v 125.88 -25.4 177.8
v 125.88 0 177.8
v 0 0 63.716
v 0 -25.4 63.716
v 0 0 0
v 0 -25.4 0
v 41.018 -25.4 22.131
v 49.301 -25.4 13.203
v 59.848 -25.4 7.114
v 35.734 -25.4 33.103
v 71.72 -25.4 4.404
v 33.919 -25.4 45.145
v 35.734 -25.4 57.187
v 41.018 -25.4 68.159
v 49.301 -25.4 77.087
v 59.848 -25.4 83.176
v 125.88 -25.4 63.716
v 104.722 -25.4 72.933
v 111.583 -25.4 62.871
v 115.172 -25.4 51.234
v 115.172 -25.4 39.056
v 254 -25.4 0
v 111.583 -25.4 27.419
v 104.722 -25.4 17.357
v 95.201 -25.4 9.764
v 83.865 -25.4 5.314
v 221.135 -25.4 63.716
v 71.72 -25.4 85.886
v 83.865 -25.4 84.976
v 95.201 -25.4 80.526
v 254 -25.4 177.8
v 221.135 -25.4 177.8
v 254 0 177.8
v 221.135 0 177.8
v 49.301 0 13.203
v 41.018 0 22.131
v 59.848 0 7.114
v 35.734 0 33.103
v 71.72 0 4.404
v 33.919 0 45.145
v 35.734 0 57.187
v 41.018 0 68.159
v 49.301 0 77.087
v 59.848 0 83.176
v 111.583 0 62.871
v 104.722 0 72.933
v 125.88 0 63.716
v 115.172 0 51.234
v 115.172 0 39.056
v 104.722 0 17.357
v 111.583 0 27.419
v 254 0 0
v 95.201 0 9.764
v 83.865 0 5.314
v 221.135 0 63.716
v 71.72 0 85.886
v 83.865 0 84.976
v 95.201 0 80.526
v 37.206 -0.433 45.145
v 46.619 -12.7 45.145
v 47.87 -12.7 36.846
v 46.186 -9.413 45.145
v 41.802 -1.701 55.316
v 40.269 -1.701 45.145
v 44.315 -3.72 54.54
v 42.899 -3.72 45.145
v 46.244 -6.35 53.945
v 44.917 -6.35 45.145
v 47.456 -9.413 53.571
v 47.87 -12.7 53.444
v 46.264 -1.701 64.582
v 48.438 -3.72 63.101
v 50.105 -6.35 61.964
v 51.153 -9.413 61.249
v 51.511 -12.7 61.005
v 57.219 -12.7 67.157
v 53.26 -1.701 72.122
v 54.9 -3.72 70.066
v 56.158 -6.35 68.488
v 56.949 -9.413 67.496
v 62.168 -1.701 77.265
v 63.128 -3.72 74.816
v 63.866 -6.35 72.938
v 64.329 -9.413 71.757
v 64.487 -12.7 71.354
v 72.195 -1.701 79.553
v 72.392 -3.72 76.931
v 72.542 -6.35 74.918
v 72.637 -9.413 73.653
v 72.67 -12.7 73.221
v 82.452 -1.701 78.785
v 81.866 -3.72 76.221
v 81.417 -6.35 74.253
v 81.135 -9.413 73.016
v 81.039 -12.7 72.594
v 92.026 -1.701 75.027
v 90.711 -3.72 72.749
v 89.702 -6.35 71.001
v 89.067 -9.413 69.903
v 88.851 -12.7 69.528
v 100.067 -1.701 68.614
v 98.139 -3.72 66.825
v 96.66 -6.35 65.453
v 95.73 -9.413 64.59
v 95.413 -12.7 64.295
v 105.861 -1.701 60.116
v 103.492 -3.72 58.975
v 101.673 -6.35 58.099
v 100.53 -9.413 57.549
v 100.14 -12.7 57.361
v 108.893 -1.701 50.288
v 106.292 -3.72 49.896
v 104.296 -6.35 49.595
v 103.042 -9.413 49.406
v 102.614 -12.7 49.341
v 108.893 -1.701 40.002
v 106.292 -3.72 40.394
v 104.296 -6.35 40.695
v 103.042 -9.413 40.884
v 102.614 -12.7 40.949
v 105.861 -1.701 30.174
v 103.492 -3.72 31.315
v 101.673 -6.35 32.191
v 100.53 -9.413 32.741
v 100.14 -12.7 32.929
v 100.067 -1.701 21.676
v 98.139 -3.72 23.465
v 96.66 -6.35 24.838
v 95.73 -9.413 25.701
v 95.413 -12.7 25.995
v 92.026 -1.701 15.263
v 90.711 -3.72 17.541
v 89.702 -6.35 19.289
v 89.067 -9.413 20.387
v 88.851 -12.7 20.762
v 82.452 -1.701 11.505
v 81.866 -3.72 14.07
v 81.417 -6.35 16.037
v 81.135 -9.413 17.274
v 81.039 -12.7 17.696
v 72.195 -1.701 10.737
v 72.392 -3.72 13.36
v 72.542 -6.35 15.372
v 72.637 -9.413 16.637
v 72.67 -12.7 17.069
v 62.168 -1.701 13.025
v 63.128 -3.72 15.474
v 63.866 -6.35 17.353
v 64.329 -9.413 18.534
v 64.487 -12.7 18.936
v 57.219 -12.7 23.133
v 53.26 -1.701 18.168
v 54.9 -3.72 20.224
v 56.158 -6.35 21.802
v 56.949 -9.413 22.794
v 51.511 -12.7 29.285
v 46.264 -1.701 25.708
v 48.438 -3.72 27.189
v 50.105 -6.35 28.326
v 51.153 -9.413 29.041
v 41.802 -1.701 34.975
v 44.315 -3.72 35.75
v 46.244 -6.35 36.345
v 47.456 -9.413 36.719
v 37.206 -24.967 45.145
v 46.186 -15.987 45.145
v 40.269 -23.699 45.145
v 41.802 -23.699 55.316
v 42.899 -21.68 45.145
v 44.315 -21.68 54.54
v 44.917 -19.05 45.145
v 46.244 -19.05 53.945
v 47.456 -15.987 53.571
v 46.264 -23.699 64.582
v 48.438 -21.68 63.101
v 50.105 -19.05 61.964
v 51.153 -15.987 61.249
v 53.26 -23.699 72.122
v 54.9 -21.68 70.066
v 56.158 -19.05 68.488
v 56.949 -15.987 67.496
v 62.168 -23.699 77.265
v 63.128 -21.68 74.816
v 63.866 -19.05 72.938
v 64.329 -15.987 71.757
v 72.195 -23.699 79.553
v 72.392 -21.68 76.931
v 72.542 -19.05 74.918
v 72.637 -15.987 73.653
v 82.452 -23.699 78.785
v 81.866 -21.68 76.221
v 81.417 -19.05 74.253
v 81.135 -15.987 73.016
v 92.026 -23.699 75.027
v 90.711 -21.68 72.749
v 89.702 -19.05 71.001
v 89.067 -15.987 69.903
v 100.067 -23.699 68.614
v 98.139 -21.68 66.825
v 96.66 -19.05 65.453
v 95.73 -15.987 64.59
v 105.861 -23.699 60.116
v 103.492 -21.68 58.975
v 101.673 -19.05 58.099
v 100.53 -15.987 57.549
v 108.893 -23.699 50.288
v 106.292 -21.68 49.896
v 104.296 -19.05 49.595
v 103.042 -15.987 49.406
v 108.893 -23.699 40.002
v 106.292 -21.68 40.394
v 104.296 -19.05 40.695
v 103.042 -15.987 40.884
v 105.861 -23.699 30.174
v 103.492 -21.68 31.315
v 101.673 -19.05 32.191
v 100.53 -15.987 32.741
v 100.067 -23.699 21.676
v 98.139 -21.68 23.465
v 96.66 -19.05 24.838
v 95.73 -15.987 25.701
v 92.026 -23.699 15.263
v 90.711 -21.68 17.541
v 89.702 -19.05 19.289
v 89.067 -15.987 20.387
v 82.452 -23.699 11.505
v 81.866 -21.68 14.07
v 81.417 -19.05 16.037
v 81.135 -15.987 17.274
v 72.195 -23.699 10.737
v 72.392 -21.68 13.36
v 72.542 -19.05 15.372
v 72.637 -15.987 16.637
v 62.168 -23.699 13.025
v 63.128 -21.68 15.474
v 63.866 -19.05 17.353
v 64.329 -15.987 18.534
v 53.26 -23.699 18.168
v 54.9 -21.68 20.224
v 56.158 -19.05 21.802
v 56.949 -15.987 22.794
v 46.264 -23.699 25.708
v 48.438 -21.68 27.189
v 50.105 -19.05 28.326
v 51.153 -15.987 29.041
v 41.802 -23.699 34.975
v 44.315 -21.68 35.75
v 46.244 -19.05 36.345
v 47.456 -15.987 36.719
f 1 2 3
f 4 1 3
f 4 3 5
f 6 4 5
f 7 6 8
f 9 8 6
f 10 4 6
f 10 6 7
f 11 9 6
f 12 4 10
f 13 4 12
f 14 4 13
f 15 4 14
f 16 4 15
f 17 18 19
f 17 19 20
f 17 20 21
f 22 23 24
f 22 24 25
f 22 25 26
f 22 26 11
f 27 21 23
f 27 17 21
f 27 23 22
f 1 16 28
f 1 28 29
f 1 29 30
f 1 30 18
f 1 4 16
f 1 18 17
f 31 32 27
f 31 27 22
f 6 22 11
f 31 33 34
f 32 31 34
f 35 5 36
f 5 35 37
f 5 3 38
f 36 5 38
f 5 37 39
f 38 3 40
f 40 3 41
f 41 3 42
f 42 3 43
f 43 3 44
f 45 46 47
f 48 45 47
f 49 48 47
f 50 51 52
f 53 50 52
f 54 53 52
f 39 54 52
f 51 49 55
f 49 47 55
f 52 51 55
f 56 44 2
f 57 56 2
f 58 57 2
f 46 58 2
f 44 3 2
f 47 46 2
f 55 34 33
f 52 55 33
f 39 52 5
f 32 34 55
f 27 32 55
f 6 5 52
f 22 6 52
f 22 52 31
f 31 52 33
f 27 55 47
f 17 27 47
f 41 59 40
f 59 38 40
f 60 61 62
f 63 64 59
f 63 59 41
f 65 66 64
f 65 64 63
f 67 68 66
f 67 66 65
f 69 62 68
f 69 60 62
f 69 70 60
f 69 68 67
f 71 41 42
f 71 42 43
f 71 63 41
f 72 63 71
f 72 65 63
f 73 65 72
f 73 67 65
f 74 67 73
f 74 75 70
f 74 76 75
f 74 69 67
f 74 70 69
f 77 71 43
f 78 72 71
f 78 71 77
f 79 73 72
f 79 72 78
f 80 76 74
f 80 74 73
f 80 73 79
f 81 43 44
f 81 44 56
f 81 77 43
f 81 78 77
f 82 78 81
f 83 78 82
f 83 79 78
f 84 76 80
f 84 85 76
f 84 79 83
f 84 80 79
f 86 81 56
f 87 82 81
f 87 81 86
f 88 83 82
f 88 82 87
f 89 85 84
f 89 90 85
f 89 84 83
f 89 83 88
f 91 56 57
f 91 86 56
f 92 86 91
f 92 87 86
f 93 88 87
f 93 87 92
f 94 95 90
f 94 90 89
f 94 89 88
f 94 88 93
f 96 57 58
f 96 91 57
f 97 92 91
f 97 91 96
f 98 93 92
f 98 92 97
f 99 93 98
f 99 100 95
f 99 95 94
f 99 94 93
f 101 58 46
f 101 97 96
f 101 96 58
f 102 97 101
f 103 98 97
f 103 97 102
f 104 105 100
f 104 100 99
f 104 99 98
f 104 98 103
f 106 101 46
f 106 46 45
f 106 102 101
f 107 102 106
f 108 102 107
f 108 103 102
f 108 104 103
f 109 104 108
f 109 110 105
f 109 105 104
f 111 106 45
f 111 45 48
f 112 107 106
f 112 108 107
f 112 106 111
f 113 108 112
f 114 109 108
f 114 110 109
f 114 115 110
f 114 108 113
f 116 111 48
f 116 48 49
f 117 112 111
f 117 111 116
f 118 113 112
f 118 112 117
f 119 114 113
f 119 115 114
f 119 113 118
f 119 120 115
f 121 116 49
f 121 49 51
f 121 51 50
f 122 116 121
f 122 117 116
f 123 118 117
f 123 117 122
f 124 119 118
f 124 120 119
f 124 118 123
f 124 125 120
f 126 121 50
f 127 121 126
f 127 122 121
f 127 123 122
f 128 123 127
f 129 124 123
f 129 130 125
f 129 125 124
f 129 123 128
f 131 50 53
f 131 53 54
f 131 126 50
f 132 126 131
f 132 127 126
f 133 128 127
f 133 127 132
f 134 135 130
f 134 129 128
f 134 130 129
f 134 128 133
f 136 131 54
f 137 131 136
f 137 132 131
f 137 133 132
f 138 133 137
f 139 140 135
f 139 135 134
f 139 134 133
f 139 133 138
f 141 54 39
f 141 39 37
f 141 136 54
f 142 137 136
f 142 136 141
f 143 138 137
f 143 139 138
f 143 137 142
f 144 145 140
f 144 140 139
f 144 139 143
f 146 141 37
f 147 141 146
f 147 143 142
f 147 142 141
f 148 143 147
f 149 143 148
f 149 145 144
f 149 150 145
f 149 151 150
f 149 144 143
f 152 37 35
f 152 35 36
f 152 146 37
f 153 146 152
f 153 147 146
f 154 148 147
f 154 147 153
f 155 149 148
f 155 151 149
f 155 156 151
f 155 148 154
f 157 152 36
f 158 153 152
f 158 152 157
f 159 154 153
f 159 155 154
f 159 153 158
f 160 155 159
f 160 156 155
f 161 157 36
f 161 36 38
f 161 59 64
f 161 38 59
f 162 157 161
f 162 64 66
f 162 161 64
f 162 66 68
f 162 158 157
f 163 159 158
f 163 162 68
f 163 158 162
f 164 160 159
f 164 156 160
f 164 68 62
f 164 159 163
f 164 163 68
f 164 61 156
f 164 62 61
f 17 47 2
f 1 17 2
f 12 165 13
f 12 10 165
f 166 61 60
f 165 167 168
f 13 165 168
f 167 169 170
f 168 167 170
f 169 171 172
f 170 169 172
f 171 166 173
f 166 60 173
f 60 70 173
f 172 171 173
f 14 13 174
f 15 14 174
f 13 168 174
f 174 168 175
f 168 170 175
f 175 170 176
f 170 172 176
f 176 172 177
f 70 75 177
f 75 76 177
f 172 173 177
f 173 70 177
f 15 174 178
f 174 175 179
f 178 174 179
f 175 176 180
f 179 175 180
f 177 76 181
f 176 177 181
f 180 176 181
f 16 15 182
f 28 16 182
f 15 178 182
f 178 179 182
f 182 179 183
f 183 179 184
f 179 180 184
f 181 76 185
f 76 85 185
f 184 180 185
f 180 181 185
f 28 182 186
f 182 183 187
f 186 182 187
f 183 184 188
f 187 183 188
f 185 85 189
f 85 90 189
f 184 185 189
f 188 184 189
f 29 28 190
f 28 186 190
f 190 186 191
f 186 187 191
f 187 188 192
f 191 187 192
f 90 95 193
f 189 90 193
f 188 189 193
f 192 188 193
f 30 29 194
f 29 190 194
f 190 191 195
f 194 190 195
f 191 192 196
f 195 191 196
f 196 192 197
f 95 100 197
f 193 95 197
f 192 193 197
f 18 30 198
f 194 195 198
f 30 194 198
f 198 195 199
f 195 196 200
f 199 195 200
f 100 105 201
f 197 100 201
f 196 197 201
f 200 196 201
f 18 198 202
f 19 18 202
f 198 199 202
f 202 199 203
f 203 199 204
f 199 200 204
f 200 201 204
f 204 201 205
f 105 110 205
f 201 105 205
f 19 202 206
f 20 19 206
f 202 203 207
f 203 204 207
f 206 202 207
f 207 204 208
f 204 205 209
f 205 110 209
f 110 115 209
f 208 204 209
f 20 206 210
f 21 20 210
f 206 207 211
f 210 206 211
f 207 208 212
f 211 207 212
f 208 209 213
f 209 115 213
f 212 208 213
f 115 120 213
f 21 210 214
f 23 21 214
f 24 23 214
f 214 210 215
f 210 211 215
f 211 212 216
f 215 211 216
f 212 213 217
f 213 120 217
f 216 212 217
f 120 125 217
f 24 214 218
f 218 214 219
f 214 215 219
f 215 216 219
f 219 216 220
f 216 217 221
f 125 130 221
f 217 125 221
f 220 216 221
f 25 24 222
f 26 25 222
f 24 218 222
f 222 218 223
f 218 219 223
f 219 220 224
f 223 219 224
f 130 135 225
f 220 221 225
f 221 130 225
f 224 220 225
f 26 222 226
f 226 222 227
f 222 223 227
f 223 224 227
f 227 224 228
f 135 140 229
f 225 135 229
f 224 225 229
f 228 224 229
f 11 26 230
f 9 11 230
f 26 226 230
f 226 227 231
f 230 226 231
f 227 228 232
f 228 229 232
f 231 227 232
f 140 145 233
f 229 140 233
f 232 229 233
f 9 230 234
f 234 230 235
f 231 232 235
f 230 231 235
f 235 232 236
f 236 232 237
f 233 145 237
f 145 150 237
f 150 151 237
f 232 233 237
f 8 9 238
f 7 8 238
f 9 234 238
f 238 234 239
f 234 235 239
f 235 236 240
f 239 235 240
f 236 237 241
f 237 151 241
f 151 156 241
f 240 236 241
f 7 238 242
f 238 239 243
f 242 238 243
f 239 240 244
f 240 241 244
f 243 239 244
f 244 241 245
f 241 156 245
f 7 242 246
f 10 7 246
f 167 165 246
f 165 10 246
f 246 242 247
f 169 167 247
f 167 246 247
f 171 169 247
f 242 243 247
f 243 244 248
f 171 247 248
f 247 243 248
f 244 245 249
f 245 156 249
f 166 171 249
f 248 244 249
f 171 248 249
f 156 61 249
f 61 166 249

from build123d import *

# Parameters (mm, degrees)
F1_DEPTH = 25.4
F2_R     = 28.1548982212
F3_DEPTH = 25.401
F4_R     = 12.69999


# Not quite as in the source:
# - a fillet or chamfer is up to 0.001 mm smaller than in the source, because OpenCascade refuses the exact size


with BuildPart() as f1:
    # F0 (on Front) → F1 (new body)
    with BuildSketch(Plane.XZ):
        Polygon((0, 63.7160863788), (0, 0), (254, 0), (254, 177.8), (221.1352040053, 177.8), (221.1352040053, 63.7160863788), (125.8798138147, 63.7160863788), (125.8798138147, 177.8), align=None)
    extrude(amount=F1_DEPTH)

    # F2 (on face) → F3 (cut, through all)
    with BuildSketch(Plane(origin=(0, 0, 0), x_dir=(-1, 0, 0), z_dir=(0, 1, 0))):
        with Locations((-74.7735798359, 45.1450571418)):
            Circle(F2_R)
    extrude(amount=-F3_DEPTH, mode=Mode.SUBTRACT)

    # F4 (radius 12.7 in the source; OpenCascade refuses exactly that, so slightly less here)
    f4_edges = [f1.edges().sort_by_distance(p)[0] for p in [
        (102.928478, 0, 45.145057),
        (102.928478, -25.4, 45.145057),
    ]]
    fillet(f4_edges, radius=F4_R)


solid = f1.part
